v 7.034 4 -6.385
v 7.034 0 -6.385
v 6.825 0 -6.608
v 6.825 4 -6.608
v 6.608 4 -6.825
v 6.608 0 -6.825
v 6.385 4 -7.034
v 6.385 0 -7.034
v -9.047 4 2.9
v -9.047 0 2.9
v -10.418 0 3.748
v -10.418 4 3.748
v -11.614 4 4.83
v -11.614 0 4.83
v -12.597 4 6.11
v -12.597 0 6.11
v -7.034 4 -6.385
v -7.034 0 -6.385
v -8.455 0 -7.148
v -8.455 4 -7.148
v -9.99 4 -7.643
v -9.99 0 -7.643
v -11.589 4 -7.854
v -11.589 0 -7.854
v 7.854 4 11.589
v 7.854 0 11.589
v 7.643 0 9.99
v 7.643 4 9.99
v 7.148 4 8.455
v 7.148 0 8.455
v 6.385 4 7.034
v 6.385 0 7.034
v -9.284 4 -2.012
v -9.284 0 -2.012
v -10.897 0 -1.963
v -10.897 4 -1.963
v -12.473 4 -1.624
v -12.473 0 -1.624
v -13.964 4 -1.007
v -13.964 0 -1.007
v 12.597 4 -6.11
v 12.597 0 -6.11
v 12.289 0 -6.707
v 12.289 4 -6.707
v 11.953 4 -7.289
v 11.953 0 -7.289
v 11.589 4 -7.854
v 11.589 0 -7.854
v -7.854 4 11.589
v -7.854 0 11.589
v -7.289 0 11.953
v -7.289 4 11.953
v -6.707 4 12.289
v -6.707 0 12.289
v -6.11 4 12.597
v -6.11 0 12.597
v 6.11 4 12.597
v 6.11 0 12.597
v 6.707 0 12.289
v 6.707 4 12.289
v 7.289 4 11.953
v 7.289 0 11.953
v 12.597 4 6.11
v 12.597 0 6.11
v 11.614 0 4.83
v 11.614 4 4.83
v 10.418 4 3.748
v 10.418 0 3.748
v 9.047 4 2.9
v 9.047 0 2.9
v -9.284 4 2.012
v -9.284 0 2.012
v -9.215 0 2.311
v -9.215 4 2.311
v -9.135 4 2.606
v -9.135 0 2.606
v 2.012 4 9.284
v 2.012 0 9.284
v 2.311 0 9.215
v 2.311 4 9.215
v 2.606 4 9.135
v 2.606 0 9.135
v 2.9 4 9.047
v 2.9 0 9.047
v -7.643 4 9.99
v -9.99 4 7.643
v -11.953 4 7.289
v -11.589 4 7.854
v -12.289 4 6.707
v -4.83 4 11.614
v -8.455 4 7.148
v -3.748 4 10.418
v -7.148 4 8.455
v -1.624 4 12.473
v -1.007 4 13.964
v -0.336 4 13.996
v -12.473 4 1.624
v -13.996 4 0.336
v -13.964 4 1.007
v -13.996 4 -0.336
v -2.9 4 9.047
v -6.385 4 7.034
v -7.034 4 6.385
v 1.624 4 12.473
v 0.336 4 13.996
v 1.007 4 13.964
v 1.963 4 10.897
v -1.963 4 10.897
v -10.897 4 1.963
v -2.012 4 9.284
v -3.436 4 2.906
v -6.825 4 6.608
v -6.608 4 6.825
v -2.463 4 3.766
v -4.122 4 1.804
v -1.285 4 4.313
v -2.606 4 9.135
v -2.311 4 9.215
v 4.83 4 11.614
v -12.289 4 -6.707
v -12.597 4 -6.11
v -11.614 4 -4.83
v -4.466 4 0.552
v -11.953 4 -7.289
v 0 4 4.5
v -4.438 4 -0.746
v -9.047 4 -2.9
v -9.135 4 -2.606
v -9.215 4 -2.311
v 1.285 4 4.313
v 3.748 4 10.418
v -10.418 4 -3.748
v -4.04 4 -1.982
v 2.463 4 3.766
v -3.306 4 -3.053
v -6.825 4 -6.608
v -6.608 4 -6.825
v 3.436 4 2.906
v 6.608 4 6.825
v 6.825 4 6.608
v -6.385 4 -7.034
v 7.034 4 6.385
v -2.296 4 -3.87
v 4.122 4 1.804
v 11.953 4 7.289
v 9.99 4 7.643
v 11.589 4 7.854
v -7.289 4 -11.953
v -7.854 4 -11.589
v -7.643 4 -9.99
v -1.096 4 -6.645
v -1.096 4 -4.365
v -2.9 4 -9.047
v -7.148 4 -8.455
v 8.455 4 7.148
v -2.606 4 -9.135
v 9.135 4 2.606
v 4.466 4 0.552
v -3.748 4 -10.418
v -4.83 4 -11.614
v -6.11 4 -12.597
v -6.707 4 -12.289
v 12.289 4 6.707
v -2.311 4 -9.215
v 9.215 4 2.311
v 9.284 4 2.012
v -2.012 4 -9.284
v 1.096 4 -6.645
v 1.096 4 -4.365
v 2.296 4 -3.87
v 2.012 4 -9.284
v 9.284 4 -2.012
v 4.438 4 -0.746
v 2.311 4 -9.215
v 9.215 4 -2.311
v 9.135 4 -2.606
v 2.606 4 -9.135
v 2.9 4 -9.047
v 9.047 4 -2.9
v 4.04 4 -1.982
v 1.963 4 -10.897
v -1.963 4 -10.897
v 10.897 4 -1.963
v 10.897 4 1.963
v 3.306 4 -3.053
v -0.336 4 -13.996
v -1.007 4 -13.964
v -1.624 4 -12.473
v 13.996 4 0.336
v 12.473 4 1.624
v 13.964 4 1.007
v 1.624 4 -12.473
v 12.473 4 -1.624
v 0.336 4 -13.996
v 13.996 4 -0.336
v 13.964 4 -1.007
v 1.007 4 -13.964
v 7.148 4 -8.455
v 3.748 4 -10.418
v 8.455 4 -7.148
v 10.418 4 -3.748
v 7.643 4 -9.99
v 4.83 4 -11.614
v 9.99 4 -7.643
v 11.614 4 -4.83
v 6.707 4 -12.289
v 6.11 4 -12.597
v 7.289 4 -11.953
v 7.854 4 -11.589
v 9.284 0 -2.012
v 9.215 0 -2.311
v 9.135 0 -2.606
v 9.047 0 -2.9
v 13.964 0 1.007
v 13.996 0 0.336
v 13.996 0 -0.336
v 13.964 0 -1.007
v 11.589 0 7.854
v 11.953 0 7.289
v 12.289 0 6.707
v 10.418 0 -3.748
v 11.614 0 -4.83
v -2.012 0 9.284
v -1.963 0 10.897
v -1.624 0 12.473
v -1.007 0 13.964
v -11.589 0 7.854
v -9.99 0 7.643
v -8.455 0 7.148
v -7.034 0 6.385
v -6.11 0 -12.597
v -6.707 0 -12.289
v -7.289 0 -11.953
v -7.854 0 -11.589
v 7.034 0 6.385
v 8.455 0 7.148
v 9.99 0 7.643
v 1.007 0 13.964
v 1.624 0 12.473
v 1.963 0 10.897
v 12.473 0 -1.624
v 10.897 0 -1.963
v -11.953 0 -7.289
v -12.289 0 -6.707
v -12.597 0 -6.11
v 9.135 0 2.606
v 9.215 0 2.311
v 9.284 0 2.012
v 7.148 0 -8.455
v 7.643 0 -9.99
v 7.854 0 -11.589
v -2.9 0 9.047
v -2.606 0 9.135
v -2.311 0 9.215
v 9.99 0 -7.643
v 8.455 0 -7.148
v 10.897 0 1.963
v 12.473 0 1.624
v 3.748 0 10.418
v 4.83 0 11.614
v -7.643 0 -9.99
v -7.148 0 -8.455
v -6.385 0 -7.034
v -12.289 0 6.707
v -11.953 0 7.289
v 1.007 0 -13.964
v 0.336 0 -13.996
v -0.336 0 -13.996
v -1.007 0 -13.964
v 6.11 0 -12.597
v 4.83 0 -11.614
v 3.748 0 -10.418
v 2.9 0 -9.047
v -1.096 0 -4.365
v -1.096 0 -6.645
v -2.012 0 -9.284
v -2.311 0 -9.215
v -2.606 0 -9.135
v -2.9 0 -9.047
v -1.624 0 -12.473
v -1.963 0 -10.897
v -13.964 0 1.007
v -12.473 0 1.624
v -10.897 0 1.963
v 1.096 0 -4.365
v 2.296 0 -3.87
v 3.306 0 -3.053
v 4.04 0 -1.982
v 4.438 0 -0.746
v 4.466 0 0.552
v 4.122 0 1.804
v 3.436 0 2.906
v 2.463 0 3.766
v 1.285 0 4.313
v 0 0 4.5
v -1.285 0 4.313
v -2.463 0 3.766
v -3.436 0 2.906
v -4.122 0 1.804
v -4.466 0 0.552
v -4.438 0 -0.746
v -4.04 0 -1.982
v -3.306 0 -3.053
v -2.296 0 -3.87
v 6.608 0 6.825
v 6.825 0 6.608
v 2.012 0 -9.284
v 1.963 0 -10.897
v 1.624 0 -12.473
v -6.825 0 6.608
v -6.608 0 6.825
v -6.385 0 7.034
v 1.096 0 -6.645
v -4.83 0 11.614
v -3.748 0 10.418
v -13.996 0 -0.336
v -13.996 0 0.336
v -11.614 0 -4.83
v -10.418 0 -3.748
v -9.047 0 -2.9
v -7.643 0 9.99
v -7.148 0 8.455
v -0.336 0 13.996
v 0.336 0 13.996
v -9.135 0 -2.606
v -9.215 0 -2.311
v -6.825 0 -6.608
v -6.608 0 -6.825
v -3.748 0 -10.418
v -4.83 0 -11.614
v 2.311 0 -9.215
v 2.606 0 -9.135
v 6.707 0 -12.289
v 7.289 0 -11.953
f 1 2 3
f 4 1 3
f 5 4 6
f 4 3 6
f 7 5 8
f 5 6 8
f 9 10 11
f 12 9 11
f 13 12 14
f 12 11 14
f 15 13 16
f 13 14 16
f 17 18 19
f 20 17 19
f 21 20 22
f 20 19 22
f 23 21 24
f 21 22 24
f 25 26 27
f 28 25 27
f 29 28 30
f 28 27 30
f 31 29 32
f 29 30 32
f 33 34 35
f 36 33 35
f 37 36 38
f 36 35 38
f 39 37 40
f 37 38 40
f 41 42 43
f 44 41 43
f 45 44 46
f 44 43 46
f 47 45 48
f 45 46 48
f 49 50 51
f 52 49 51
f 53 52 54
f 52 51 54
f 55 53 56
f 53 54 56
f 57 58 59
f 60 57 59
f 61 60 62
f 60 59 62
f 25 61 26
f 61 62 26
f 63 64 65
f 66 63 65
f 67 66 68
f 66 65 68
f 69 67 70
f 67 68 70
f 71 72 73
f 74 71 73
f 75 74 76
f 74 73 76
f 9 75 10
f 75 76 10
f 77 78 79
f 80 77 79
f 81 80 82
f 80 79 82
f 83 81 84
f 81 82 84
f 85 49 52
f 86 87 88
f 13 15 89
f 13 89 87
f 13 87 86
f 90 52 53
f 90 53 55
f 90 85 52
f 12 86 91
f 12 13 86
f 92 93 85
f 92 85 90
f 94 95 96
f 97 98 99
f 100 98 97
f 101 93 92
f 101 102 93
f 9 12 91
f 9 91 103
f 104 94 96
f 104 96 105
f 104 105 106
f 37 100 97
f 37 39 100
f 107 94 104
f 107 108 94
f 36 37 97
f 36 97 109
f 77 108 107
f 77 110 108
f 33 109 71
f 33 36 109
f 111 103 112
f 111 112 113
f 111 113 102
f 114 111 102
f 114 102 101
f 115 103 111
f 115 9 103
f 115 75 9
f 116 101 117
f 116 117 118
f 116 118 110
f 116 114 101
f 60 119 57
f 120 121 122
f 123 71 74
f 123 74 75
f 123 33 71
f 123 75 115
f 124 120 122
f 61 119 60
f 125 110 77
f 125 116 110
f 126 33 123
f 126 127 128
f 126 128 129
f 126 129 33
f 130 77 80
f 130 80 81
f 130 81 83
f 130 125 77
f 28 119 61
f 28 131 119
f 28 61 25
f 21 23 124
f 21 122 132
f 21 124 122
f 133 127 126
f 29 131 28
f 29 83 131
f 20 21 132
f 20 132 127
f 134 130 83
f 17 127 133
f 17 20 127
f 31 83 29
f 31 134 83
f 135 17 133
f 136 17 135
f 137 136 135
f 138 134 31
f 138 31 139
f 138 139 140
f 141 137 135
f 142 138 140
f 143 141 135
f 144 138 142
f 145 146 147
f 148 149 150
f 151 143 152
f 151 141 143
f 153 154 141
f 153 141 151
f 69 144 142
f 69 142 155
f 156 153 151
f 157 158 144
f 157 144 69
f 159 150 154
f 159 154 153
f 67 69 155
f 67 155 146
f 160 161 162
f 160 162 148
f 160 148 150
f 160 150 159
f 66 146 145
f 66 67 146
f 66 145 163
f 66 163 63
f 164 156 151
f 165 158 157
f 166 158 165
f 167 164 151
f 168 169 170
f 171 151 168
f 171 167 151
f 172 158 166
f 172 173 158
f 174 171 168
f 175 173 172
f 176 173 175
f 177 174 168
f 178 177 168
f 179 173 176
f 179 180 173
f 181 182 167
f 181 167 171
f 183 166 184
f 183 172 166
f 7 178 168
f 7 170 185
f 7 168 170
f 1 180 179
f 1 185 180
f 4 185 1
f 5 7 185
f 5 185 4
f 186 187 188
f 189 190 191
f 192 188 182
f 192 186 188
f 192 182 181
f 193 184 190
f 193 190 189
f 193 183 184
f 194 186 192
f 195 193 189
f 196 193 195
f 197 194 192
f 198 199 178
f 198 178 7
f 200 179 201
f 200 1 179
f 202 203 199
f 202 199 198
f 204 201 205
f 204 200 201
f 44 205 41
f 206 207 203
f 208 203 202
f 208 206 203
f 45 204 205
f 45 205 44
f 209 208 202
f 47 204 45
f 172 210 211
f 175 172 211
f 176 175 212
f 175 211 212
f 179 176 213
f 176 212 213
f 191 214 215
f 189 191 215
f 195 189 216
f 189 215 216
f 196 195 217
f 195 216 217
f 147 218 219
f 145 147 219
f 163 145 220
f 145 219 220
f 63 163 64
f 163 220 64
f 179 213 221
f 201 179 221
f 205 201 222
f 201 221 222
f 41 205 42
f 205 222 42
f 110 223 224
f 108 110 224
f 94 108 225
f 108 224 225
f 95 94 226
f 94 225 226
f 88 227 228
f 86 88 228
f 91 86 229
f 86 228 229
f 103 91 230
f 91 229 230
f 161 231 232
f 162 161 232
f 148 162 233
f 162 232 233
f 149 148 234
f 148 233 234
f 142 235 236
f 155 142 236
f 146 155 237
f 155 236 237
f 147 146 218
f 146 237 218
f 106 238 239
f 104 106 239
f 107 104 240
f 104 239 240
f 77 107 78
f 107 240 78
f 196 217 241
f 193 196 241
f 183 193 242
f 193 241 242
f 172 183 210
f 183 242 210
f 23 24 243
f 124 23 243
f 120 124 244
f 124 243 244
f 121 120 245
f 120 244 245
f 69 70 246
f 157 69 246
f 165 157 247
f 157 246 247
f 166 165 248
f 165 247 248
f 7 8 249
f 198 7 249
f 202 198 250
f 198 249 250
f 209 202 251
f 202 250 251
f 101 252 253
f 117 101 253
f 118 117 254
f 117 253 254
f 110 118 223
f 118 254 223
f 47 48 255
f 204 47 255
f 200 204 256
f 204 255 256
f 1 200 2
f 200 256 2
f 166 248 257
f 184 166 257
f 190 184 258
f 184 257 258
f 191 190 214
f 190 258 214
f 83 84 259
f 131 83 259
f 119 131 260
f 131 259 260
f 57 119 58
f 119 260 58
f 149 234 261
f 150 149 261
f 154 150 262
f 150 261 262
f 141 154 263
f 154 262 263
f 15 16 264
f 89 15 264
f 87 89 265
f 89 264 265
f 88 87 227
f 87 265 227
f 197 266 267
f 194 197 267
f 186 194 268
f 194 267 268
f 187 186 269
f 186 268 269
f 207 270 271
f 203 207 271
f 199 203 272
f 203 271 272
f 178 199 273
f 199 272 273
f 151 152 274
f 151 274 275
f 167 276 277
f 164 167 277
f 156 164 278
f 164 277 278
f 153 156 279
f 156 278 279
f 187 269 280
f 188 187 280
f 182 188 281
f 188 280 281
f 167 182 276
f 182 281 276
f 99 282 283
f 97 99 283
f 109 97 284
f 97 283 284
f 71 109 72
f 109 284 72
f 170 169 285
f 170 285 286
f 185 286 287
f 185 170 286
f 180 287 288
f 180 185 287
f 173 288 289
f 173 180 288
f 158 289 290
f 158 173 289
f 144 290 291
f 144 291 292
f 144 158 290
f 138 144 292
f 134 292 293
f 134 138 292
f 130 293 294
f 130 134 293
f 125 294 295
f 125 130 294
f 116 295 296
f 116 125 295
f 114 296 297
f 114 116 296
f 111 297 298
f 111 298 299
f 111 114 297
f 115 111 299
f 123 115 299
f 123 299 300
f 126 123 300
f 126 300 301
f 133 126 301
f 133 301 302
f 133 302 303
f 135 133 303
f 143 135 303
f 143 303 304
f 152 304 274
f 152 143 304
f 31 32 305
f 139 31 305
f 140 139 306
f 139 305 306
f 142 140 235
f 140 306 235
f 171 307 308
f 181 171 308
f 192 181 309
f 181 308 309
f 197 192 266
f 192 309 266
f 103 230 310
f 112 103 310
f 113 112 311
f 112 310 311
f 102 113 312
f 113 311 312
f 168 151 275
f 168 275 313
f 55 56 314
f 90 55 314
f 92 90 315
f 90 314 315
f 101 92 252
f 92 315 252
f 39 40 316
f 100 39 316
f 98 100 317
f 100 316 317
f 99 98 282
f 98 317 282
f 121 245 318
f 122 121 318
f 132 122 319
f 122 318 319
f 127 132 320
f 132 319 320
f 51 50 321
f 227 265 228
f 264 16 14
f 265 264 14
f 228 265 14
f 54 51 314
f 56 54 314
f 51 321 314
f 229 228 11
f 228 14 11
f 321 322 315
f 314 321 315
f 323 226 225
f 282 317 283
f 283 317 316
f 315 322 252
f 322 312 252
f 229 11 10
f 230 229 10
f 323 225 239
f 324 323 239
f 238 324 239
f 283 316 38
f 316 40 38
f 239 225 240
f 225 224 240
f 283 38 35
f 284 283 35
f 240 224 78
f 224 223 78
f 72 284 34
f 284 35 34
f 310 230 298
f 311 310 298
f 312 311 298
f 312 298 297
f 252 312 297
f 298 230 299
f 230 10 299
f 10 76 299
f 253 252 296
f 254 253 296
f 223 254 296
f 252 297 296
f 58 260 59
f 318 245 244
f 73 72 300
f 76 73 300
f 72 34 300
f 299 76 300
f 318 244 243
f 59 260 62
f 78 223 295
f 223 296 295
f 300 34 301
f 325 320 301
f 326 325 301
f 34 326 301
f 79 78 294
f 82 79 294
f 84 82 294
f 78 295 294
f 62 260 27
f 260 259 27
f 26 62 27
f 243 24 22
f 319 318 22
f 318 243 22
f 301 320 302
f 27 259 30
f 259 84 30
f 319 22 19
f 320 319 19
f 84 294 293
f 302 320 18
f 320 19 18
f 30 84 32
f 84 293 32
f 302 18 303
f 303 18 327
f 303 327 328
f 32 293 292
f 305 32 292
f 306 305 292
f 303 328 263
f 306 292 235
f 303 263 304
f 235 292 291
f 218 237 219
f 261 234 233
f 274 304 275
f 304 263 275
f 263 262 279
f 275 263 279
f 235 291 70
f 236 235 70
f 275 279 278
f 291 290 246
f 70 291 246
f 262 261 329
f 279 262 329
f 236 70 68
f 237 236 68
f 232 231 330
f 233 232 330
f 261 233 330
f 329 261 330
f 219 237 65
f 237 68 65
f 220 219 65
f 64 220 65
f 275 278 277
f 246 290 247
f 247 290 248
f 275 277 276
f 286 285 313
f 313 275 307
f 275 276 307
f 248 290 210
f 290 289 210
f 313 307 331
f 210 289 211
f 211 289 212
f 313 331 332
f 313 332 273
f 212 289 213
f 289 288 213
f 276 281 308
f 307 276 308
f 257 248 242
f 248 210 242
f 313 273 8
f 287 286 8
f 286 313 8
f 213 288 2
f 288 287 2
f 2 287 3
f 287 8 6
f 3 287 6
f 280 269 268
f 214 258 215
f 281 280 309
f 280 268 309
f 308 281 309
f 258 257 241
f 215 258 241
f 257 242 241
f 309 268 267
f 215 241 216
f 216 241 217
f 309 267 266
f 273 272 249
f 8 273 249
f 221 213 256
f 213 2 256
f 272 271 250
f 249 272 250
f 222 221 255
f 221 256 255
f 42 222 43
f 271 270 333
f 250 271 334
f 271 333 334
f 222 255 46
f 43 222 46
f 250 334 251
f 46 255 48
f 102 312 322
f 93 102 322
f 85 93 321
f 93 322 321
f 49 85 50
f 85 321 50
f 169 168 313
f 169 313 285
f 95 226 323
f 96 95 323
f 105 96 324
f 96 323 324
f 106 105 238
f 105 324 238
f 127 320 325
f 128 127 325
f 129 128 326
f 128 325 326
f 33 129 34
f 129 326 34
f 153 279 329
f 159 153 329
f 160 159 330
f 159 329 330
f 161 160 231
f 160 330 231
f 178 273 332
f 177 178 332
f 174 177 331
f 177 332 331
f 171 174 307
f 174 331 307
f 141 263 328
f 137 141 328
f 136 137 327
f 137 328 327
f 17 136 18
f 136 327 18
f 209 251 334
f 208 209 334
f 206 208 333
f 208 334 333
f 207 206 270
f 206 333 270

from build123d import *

# Parameters (mm, degrees)
EXTRUDE_1_DEPTH     = 4
CUT_EXTRUDE_1_DEPTH = 4


with BuildPart() as part:
    # 草图1 → 凸台-拉伸1 (new body)
    with BuildSketch(Plane(origin=(0, 0, 0), x_dir=(1, 0, 0), z_dir=(0, 1, 0))):
        with BuildLine():
            ThreePointArc((1.007141152, 13.96372682), (0, 14), (-1.007141152, 13.96372682))
            ThreePointArc((-1.007141152, 13.96372682), (-1.829065946, 11.692687307), (-2.012232645, 9.284445044))
            ThreePointArc((-2.012232645, 9.284445044), (-2.458780928, 9.17629535), (-2.899577934, 9.046681591))
            ThreePointArc((-2.899577934, 9.046681591), (-4.262326079, 11.04069722), (-6.109653587, 12.596512734))
            ThreePointArc((-6.109653587, 12.596512734), (-7, 12.124355653), (-7.854073233, 11.589371581))
            ThreePointArc((-7.854073233, 11.589371581), (-7.430361228, 9.211631273), (-6.384867111, 7.034448946))
            ThreePointArc((-6.384867111, 7.034448946), (-6.717514421, 6.717514421), (-7.034448946, 6.384867111))
            ThreePointArc((-7.034448946, 6.384867111), (-9.211631273, 7.430361228), (-11.589371581, 7.854073233))
            ThreePointArc((-11.589371581, 7.854073233), (-12.124355653, 7), (-12.596512734, 6.109653587))
            ThreePointArc((-12.596512734, 6.109653587), (-11.04069722, 4.262326079), (-9.046681591, 2.899577934))
            ThreePointArc((-9.046681591, 2.899577934), (-9.17629535, 2.458780928), (-9.284445044, 2.012232645))
            ThreePointArc((-9.284445044, 2.012232645), (-11.692687307, 1.829065946), (-13.96372682, 1.007141152))
            ThreePointArc((-13.96372682, 1.007141152), (-14, 0), (-13.96372682, -1.007141152))
            ThreePointArc((-13.96372682, -1.007141152), (-11.692687307, -1.829065946), (-9.284445044, -2.012232645))
            ThreePointArc((-9.284445044, -2.012232645), (-9.17629535, -2.458780928), (-9.046681591, -2.899577934))
            ThreePointArc((-9.046681591, -2.899577934), (-11.04069722, -4.262326079), (-12.596512734, -6.109653587))
            ThreePointArc((-12.596512734, -6.109653587), (-12.124355653, -7), (-11.589371581, -7.854073233))
            ThreePointArc((-11.589371581, -7.854073233), (-9.211631273, -7.430361228), (-7.034448946, -6.384867111))
            ThreePointArc((-7.034448946, -6.384867111), (-6.717514421, -6.717514421), (-6.384867111, -7.034448946))
            ThreePointArc((-6.384867111, -7.034448946), (-7.430361228, -9.211631273), (-7.854073233, -11.589371581))
            ThreePointArc((-7.854073233, -11.589371581), (-7, -12.124355653), (-6.109653587, -12.596512734))
            ThreePointArc((-6.109653587, -12.596512734), (-4.262326079, -11.04069722), (-2.899577934, -9.046681591))
            ThreePointArc((-2.899577934, -9.046681591), (-2.458780928, -9.17629535), (-2.012232645, -9.284445044))
            ThreePointArc((-2.012232645, -9.284445044), (-1.829065946, -11.692687307), (-1.007141152, -13.96372682))
            ThreePointArc((-1.007141152, -13.96372682), (0, -14), (1.007141152, -13.96372682))
            ThreePointArc((1.007141152, -13.96372682), (1.829065946, -11.692687307), (2.012232645, -9.284445044))
            ThreePointArc((2.012232645, -9.284445044), (2.458780928, -9.17629535), (2.899577934, -9.046681591))
            ThreePointArc((2.899577934, -9.046681591), (4.262326079, -11.04069722), (6.109653587, -12.596512734))
            ThreePointArc((6.109653587, -12.596512734), (7, -12.124355653), (7.854073233, -11.589371581))
            ThreePointArc((7.854073233, -11.589371581), (7.430361228, -9.211631273), (6.384867111, -7.034448946))
            ThreePointArc((6.384867111, -7.034448946), (6.717514421, -6.717514421), (7.034448946, -6.384867111))
            ThreePointArc((7.034448946, -6.384867111), (9.211631273, -7.430361228), (11.589371581, -7.854073233))
            ThreePointArc((11.589371581, -7.854073233), (12.124355653, -7), (12.596512734, -6.109653587))
            ThreePointArc((12.596512734, -6.109653587), (11.04069722, -4.262326079), (9.046681591, -2.899577934))
            ThreePointArc((9.046681591, -2.899577934), (9.17629535, -2.458780928), (9.284445044, -2.012232645))
            ThreePointArc((9.284445044, -2.012232645), (11.692687307, -1.829065946), (13.96372682, -1.007141152))
            ThreePointArc((13.96372682, -1.007141152), (14, 0), (13.96372682, 1.007141152))
            ThreePointArc((13.96372682, 1.007141152), (11.692687307, 1.829065946), (9.284445044, 2.012232645))
            ThreePointArc((9.284445044, 2.012232645), (9.17629535, 2.458780928), (9.046681591, 2.899577934))
            ThreePointArc((9.046681591, 2.899577934), (11.04069722, 4.262326079), (12.596512734, 6.109653587))
            ThreePointArc((12.596512734, 6.109653587), (12.124355653, 7), (11.589371581, 7.854073233))
            ThreePointArc((11.589371581, 7.854073233), (9.211631273, 7.430361228), (7.034448946, 6.384867111))
            ThreePointArc((7.034448946, 6.384867111), (6.717514421, 6.717514421), (6.384867111, 7.034448946))
            ThreePointArc((6.384867111, 7.034448946), (7.430361228, 9.211631273), (7.854073233, 11.589371581))
            ThreePointArc((7.854073233, 11.589371581), (7, 12.124355653), (6.109653587, 12.596512734))
            ThreePointArc((6.109653587, 12.596512734), (4.262326079, 11.04069722), (2.899577934, 9.046681591))
            ThreePointArc((2.899577934, 9.046681591), (2.458780928, 9.17629535), (2.012232645, 9.284445044))
            ThreePointArc((2.012232645, 9.284445044), (1.829065946, 11.692687307), (1.007141152, 13.96372682))
        make_face()
    extrude(amount=EXTRUDE_1_DEPTH)

    # 草图2 → 切除-拉伸1 (cut)
    with BuildSketch(Plane(origin=(0, 4, 0), x_dir=(1, 0, 0), z_dir=(0, 1, 0))):
        with BuildLine():
            Line((-1.095859036, 4.364526661), (-1.095859036, 6.645001166))
            Line((-1.095859036, 6.645001166), (1.095859036, 6.645001166))
            Line((1.095859036, 6.645001166), (1.095859036, 4.364526661))
            ThreePointArc((1.095859036, 4.364526661), (0, -4.5), (-1.095859036, 4.364526661))
        make_face()
    extrude(amount=-CUT_EXTRUDE_1_DEPTH, mode=Mode.SUBTRACT)


solid = part.part
